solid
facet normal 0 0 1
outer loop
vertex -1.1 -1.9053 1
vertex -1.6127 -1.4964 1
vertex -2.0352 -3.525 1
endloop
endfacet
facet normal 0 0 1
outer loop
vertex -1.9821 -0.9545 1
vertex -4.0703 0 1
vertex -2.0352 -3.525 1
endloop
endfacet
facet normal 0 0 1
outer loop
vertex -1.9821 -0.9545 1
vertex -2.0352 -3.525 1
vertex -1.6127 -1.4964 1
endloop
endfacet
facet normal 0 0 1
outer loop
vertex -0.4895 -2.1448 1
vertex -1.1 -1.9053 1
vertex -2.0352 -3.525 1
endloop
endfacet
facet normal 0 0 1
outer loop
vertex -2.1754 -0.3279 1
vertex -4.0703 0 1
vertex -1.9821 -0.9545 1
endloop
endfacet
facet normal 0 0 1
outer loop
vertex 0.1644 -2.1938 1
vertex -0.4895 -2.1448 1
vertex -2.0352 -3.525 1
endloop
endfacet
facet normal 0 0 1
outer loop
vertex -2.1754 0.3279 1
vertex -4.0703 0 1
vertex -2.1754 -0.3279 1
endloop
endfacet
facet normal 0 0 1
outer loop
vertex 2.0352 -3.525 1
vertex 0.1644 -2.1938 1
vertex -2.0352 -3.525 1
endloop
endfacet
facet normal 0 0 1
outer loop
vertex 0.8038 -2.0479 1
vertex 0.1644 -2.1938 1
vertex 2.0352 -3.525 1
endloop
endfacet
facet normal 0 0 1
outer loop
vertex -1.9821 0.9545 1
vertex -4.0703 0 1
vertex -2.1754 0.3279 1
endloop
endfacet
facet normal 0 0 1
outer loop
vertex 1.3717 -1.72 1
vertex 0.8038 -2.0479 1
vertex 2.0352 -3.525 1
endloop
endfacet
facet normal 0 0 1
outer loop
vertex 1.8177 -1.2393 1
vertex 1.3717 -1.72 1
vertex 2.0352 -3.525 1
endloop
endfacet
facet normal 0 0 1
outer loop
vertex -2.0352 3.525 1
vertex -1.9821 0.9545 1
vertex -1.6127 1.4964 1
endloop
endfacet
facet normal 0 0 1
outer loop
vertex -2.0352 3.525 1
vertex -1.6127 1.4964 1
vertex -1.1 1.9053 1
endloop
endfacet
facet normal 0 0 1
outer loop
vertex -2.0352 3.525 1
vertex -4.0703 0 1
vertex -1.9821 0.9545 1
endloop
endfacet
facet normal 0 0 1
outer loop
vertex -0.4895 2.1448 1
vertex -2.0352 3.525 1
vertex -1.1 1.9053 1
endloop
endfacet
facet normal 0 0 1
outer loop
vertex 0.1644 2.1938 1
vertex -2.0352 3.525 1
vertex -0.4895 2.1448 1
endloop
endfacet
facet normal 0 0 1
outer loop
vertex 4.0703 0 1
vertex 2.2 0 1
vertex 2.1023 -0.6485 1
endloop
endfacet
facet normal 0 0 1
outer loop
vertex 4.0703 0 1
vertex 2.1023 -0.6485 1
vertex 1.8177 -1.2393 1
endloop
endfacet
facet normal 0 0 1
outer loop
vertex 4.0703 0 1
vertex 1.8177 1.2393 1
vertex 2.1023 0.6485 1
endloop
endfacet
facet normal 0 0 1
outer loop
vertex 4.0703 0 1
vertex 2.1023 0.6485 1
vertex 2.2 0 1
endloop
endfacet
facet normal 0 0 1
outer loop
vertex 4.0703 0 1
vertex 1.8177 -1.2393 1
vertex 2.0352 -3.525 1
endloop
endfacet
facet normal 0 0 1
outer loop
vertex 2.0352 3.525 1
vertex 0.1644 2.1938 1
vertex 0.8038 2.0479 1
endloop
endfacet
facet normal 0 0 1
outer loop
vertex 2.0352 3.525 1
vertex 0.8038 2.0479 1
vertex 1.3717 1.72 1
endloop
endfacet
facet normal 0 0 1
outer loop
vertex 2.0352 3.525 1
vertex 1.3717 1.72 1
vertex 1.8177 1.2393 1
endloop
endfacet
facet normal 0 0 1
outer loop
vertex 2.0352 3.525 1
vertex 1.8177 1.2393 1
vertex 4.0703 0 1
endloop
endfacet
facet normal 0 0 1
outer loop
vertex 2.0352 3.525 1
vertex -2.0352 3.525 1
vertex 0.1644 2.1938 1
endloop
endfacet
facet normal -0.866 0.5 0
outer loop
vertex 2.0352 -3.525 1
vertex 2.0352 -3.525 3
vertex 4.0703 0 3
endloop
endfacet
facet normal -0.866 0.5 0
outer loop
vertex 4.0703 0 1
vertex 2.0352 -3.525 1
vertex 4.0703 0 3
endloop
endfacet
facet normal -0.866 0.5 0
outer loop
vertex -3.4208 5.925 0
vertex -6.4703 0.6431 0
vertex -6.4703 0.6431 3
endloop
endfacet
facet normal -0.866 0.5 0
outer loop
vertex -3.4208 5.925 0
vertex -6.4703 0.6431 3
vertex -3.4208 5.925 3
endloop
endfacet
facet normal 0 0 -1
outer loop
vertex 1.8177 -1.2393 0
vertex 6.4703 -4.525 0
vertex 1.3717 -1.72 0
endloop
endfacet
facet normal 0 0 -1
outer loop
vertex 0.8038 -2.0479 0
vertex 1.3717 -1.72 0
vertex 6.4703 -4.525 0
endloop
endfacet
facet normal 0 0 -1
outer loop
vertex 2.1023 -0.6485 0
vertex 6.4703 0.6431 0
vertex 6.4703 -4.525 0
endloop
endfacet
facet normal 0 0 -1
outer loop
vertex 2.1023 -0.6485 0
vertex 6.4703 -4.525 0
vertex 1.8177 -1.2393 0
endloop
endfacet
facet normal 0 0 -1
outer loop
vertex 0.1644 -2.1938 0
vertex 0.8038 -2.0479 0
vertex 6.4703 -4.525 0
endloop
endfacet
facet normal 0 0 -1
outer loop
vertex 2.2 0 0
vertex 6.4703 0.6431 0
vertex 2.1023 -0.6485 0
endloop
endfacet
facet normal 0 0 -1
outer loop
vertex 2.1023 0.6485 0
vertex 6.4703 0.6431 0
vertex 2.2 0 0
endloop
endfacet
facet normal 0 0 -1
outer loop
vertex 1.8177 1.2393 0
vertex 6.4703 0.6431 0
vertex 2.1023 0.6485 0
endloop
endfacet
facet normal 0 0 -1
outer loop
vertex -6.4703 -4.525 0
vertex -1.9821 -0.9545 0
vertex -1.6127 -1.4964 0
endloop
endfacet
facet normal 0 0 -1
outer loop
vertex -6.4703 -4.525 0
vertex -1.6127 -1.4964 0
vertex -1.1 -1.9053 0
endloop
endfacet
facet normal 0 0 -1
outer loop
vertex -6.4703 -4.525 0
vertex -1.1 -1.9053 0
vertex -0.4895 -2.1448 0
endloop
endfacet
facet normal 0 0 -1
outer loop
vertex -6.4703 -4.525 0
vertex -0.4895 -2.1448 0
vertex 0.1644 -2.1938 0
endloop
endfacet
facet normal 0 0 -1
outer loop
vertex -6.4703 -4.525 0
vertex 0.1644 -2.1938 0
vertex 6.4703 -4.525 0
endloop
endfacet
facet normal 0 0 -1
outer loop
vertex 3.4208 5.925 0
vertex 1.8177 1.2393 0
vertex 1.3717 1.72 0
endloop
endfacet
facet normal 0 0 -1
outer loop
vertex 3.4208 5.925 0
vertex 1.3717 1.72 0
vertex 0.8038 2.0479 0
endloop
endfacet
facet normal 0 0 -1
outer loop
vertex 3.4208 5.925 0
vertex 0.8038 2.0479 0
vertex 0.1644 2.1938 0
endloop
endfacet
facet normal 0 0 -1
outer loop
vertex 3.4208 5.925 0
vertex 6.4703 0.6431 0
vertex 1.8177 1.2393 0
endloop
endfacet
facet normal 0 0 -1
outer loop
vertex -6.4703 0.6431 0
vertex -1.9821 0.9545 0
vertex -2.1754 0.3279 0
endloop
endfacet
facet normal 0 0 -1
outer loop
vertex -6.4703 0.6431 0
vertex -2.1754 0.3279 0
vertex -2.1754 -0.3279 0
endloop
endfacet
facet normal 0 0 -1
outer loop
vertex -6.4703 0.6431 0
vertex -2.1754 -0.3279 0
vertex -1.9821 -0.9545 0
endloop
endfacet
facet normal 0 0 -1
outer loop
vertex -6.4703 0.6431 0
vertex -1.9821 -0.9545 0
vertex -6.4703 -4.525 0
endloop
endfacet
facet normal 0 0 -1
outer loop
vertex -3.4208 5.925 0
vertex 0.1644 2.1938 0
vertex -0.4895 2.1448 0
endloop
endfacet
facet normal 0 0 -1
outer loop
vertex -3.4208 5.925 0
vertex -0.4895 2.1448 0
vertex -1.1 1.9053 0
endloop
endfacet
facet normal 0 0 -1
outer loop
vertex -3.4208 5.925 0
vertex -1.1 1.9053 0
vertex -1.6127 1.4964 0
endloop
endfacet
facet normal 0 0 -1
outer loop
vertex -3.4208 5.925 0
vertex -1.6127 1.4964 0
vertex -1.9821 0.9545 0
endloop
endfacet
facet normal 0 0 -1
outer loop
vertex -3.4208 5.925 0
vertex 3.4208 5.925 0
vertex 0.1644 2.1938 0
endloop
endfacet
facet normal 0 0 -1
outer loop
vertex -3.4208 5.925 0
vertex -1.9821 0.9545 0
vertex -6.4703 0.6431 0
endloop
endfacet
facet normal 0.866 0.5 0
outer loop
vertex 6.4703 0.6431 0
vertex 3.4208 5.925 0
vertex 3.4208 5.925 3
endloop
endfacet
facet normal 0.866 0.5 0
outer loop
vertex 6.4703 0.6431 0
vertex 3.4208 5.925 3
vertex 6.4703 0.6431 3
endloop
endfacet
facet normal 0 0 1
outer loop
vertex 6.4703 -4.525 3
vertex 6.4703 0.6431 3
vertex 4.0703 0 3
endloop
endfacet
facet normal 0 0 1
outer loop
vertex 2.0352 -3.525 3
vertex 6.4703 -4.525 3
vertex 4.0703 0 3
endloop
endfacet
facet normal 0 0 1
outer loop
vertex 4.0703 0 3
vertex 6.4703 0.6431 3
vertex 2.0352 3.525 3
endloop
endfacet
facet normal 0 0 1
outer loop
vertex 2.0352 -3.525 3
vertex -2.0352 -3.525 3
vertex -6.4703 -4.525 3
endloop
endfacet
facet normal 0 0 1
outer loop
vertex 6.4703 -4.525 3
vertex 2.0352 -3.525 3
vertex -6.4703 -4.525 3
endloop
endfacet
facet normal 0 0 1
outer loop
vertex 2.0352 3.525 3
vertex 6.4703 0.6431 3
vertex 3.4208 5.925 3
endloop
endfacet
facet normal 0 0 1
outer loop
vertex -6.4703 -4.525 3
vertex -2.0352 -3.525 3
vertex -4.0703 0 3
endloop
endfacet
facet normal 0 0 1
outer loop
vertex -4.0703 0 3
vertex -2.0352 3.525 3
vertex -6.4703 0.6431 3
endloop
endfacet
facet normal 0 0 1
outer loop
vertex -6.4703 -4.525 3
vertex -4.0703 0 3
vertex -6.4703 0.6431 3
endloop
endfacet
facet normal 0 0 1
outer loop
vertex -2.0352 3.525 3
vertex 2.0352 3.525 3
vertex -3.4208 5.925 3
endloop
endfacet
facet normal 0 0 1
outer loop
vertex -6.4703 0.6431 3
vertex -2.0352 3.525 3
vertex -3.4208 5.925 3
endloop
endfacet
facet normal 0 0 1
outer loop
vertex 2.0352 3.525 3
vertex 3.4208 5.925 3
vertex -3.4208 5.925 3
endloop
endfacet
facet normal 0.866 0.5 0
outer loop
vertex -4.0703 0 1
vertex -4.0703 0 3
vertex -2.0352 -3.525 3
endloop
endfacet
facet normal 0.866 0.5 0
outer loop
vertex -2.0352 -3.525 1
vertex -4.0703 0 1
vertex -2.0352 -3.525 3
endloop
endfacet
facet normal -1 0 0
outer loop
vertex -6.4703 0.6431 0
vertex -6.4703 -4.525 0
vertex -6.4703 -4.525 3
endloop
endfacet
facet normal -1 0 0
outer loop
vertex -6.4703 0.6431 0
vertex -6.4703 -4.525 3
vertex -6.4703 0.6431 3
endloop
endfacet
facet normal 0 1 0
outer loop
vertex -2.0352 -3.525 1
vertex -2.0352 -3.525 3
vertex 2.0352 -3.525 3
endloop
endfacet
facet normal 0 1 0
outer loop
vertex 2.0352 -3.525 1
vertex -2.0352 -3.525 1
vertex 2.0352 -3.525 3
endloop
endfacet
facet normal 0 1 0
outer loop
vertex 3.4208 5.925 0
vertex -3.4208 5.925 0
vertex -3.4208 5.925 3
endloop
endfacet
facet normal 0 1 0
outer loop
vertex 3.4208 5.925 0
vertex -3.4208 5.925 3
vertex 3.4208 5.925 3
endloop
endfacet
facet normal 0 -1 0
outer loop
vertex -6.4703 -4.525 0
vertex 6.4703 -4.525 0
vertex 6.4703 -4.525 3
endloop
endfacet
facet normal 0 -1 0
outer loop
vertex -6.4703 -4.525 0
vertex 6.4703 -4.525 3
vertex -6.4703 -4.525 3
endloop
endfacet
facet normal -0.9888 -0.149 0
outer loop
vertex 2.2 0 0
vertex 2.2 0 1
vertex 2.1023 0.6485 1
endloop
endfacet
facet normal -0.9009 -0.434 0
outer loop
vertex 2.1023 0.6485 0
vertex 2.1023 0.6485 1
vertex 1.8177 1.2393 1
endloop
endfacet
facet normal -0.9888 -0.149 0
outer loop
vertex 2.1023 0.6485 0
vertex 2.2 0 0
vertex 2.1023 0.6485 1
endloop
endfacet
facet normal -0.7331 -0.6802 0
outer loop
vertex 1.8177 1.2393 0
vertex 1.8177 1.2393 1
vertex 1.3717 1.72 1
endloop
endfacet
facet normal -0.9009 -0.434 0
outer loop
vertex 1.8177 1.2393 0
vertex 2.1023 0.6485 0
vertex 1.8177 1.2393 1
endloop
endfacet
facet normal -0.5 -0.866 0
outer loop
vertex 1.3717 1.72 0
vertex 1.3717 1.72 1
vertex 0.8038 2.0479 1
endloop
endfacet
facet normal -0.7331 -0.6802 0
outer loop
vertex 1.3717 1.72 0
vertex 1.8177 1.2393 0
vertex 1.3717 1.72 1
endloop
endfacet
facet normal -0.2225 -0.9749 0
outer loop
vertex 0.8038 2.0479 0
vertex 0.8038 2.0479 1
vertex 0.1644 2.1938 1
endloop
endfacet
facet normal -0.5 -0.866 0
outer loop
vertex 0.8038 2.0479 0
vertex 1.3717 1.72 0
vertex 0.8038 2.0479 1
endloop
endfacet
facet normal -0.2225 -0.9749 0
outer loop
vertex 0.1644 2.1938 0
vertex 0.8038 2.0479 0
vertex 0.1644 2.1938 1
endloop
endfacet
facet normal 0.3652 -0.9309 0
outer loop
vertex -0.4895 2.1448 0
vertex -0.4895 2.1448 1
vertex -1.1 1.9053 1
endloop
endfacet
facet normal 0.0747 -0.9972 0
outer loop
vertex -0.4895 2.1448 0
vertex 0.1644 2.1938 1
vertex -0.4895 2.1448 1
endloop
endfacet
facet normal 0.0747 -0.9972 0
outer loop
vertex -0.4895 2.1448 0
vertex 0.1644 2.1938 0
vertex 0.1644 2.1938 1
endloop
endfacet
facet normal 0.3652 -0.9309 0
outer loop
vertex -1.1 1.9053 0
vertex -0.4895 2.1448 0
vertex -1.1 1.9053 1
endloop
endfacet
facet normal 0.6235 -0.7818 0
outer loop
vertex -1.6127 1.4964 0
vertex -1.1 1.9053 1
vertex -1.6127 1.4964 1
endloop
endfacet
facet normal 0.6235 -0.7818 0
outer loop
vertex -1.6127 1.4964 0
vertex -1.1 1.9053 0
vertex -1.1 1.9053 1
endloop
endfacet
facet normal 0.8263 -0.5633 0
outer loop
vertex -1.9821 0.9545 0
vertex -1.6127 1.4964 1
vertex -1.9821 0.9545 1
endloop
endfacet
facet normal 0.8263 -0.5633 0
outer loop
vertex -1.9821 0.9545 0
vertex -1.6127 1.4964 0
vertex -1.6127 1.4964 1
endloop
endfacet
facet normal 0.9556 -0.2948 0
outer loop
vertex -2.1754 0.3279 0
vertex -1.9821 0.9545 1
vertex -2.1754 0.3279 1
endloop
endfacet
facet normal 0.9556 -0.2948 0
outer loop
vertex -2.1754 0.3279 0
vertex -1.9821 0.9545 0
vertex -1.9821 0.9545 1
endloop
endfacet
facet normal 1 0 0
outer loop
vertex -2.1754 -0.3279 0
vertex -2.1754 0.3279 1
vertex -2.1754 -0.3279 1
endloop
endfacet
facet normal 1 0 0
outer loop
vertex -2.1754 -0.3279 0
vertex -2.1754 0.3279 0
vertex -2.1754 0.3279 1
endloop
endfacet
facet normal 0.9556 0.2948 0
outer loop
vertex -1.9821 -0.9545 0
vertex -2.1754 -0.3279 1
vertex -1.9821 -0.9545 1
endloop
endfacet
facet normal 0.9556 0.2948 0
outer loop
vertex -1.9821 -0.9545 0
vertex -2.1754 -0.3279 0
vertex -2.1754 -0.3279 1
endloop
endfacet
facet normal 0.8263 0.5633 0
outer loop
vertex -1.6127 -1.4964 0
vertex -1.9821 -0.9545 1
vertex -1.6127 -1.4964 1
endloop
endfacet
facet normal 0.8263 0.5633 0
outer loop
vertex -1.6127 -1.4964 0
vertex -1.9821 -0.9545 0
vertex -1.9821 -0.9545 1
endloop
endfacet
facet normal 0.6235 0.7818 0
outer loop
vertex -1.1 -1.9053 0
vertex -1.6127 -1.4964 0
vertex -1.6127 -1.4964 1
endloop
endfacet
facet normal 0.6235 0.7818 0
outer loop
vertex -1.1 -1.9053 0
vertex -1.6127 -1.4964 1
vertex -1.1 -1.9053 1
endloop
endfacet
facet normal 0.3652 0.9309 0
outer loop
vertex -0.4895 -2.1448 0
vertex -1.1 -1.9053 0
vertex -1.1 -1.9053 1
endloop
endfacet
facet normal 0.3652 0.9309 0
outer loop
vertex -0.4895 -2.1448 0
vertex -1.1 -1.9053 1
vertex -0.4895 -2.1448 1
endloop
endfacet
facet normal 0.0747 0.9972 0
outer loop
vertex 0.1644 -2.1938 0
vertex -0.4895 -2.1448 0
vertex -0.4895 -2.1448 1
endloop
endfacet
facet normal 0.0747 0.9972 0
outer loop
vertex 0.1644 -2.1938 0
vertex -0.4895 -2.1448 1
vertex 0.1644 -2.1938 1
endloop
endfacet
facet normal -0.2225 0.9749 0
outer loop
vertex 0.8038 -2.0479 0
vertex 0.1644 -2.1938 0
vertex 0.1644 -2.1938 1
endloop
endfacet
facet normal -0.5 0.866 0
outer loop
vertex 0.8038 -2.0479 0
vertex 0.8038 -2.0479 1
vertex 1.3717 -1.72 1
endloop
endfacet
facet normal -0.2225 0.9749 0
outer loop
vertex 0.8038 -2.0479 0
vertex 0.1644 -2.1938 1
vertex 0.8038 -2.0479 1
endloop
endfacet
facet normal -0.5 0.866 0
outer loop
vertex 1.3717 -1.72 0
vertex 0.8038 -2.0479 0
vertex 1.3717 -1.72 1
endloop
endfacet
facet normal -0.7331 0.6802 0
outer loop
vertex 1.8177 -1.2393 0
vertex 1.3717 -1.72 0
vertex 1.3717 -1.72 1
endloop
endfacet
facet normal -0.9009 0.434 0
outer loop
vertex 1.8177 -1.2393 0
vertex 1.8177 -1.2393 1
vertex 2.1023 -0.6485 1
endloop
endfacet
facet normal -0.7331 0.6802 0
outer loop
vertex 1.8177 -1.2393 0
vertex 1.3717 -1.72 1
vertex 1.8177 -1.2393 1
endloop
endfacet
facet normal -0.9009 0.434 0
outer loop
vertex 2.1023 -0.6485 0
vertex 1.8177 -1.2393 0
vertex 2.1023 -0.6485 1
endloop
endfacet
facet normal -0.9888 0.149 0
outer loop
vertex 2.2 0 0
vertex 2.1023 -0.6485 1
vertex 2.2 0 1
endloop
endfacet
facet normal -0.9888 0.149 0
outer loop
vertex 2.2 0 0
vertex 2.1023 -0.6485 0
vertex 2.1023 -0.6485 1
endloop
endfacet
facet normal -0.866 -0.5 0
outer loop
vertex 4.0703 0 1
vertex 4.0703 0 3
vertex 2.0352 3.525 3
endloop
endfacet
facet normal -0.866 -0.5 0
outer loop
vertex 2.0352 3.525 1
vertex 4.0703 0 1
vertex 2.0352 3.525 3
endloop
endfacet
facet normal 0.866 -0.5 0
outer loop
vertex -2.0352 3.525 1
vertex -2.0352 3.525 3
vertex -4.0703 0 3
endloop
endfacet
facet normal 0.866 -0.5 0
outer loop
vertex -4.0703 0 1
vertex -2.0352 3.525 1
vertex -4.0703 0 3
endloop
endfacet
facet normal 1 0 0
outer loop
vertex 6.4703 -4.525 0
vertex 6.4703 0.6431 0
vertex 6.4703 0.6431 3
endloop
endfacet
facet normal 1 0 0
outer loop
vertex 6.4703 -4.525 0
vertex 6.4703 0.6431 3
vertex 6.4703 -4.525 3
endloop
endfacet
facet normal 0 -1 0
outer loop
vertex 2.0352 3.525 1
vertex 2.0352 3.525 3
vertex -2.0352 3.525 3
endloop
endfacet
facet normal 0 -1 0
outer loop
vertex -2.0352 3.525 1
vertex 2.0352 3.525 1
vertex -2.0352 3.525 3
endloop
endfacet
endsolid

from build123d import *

# Parameters (mm, degrees)
SKETCH_R     = 2.2
PAD_DEPTH    = 3
POCKET_DEPTH = 2


with BuildPart() as part:
    # Sketch → Pad (new body)
    with BuildSketch(Plane.XY):
        Polygon((6.470319, -4.525), (-6.470319, -4.525), (-6.470319, 0.643078), (-3.4208, 5.925), (3.4208, 5.925), (6.470319, 0.643078), align=None)
        Circle(SKETCH_R, mode=Mode.SUBTRACT)
    extrude(amount=PAD_DEPTH)

    # Sketch001 → Pocket (cut)
    with BuildSketch(Plane.XY.offset(3)):
        Polygon((4.070319, 0), (2.03516, 3.525), (-2.03516, 3.525), (-4.070319, 0), (-2.03516, -3.525), (2.03516, -3.525), align=None)
    extrude(amount=-POCKET_DEPTH, mode=Mode.SUBTRACT)


solid = part.part
